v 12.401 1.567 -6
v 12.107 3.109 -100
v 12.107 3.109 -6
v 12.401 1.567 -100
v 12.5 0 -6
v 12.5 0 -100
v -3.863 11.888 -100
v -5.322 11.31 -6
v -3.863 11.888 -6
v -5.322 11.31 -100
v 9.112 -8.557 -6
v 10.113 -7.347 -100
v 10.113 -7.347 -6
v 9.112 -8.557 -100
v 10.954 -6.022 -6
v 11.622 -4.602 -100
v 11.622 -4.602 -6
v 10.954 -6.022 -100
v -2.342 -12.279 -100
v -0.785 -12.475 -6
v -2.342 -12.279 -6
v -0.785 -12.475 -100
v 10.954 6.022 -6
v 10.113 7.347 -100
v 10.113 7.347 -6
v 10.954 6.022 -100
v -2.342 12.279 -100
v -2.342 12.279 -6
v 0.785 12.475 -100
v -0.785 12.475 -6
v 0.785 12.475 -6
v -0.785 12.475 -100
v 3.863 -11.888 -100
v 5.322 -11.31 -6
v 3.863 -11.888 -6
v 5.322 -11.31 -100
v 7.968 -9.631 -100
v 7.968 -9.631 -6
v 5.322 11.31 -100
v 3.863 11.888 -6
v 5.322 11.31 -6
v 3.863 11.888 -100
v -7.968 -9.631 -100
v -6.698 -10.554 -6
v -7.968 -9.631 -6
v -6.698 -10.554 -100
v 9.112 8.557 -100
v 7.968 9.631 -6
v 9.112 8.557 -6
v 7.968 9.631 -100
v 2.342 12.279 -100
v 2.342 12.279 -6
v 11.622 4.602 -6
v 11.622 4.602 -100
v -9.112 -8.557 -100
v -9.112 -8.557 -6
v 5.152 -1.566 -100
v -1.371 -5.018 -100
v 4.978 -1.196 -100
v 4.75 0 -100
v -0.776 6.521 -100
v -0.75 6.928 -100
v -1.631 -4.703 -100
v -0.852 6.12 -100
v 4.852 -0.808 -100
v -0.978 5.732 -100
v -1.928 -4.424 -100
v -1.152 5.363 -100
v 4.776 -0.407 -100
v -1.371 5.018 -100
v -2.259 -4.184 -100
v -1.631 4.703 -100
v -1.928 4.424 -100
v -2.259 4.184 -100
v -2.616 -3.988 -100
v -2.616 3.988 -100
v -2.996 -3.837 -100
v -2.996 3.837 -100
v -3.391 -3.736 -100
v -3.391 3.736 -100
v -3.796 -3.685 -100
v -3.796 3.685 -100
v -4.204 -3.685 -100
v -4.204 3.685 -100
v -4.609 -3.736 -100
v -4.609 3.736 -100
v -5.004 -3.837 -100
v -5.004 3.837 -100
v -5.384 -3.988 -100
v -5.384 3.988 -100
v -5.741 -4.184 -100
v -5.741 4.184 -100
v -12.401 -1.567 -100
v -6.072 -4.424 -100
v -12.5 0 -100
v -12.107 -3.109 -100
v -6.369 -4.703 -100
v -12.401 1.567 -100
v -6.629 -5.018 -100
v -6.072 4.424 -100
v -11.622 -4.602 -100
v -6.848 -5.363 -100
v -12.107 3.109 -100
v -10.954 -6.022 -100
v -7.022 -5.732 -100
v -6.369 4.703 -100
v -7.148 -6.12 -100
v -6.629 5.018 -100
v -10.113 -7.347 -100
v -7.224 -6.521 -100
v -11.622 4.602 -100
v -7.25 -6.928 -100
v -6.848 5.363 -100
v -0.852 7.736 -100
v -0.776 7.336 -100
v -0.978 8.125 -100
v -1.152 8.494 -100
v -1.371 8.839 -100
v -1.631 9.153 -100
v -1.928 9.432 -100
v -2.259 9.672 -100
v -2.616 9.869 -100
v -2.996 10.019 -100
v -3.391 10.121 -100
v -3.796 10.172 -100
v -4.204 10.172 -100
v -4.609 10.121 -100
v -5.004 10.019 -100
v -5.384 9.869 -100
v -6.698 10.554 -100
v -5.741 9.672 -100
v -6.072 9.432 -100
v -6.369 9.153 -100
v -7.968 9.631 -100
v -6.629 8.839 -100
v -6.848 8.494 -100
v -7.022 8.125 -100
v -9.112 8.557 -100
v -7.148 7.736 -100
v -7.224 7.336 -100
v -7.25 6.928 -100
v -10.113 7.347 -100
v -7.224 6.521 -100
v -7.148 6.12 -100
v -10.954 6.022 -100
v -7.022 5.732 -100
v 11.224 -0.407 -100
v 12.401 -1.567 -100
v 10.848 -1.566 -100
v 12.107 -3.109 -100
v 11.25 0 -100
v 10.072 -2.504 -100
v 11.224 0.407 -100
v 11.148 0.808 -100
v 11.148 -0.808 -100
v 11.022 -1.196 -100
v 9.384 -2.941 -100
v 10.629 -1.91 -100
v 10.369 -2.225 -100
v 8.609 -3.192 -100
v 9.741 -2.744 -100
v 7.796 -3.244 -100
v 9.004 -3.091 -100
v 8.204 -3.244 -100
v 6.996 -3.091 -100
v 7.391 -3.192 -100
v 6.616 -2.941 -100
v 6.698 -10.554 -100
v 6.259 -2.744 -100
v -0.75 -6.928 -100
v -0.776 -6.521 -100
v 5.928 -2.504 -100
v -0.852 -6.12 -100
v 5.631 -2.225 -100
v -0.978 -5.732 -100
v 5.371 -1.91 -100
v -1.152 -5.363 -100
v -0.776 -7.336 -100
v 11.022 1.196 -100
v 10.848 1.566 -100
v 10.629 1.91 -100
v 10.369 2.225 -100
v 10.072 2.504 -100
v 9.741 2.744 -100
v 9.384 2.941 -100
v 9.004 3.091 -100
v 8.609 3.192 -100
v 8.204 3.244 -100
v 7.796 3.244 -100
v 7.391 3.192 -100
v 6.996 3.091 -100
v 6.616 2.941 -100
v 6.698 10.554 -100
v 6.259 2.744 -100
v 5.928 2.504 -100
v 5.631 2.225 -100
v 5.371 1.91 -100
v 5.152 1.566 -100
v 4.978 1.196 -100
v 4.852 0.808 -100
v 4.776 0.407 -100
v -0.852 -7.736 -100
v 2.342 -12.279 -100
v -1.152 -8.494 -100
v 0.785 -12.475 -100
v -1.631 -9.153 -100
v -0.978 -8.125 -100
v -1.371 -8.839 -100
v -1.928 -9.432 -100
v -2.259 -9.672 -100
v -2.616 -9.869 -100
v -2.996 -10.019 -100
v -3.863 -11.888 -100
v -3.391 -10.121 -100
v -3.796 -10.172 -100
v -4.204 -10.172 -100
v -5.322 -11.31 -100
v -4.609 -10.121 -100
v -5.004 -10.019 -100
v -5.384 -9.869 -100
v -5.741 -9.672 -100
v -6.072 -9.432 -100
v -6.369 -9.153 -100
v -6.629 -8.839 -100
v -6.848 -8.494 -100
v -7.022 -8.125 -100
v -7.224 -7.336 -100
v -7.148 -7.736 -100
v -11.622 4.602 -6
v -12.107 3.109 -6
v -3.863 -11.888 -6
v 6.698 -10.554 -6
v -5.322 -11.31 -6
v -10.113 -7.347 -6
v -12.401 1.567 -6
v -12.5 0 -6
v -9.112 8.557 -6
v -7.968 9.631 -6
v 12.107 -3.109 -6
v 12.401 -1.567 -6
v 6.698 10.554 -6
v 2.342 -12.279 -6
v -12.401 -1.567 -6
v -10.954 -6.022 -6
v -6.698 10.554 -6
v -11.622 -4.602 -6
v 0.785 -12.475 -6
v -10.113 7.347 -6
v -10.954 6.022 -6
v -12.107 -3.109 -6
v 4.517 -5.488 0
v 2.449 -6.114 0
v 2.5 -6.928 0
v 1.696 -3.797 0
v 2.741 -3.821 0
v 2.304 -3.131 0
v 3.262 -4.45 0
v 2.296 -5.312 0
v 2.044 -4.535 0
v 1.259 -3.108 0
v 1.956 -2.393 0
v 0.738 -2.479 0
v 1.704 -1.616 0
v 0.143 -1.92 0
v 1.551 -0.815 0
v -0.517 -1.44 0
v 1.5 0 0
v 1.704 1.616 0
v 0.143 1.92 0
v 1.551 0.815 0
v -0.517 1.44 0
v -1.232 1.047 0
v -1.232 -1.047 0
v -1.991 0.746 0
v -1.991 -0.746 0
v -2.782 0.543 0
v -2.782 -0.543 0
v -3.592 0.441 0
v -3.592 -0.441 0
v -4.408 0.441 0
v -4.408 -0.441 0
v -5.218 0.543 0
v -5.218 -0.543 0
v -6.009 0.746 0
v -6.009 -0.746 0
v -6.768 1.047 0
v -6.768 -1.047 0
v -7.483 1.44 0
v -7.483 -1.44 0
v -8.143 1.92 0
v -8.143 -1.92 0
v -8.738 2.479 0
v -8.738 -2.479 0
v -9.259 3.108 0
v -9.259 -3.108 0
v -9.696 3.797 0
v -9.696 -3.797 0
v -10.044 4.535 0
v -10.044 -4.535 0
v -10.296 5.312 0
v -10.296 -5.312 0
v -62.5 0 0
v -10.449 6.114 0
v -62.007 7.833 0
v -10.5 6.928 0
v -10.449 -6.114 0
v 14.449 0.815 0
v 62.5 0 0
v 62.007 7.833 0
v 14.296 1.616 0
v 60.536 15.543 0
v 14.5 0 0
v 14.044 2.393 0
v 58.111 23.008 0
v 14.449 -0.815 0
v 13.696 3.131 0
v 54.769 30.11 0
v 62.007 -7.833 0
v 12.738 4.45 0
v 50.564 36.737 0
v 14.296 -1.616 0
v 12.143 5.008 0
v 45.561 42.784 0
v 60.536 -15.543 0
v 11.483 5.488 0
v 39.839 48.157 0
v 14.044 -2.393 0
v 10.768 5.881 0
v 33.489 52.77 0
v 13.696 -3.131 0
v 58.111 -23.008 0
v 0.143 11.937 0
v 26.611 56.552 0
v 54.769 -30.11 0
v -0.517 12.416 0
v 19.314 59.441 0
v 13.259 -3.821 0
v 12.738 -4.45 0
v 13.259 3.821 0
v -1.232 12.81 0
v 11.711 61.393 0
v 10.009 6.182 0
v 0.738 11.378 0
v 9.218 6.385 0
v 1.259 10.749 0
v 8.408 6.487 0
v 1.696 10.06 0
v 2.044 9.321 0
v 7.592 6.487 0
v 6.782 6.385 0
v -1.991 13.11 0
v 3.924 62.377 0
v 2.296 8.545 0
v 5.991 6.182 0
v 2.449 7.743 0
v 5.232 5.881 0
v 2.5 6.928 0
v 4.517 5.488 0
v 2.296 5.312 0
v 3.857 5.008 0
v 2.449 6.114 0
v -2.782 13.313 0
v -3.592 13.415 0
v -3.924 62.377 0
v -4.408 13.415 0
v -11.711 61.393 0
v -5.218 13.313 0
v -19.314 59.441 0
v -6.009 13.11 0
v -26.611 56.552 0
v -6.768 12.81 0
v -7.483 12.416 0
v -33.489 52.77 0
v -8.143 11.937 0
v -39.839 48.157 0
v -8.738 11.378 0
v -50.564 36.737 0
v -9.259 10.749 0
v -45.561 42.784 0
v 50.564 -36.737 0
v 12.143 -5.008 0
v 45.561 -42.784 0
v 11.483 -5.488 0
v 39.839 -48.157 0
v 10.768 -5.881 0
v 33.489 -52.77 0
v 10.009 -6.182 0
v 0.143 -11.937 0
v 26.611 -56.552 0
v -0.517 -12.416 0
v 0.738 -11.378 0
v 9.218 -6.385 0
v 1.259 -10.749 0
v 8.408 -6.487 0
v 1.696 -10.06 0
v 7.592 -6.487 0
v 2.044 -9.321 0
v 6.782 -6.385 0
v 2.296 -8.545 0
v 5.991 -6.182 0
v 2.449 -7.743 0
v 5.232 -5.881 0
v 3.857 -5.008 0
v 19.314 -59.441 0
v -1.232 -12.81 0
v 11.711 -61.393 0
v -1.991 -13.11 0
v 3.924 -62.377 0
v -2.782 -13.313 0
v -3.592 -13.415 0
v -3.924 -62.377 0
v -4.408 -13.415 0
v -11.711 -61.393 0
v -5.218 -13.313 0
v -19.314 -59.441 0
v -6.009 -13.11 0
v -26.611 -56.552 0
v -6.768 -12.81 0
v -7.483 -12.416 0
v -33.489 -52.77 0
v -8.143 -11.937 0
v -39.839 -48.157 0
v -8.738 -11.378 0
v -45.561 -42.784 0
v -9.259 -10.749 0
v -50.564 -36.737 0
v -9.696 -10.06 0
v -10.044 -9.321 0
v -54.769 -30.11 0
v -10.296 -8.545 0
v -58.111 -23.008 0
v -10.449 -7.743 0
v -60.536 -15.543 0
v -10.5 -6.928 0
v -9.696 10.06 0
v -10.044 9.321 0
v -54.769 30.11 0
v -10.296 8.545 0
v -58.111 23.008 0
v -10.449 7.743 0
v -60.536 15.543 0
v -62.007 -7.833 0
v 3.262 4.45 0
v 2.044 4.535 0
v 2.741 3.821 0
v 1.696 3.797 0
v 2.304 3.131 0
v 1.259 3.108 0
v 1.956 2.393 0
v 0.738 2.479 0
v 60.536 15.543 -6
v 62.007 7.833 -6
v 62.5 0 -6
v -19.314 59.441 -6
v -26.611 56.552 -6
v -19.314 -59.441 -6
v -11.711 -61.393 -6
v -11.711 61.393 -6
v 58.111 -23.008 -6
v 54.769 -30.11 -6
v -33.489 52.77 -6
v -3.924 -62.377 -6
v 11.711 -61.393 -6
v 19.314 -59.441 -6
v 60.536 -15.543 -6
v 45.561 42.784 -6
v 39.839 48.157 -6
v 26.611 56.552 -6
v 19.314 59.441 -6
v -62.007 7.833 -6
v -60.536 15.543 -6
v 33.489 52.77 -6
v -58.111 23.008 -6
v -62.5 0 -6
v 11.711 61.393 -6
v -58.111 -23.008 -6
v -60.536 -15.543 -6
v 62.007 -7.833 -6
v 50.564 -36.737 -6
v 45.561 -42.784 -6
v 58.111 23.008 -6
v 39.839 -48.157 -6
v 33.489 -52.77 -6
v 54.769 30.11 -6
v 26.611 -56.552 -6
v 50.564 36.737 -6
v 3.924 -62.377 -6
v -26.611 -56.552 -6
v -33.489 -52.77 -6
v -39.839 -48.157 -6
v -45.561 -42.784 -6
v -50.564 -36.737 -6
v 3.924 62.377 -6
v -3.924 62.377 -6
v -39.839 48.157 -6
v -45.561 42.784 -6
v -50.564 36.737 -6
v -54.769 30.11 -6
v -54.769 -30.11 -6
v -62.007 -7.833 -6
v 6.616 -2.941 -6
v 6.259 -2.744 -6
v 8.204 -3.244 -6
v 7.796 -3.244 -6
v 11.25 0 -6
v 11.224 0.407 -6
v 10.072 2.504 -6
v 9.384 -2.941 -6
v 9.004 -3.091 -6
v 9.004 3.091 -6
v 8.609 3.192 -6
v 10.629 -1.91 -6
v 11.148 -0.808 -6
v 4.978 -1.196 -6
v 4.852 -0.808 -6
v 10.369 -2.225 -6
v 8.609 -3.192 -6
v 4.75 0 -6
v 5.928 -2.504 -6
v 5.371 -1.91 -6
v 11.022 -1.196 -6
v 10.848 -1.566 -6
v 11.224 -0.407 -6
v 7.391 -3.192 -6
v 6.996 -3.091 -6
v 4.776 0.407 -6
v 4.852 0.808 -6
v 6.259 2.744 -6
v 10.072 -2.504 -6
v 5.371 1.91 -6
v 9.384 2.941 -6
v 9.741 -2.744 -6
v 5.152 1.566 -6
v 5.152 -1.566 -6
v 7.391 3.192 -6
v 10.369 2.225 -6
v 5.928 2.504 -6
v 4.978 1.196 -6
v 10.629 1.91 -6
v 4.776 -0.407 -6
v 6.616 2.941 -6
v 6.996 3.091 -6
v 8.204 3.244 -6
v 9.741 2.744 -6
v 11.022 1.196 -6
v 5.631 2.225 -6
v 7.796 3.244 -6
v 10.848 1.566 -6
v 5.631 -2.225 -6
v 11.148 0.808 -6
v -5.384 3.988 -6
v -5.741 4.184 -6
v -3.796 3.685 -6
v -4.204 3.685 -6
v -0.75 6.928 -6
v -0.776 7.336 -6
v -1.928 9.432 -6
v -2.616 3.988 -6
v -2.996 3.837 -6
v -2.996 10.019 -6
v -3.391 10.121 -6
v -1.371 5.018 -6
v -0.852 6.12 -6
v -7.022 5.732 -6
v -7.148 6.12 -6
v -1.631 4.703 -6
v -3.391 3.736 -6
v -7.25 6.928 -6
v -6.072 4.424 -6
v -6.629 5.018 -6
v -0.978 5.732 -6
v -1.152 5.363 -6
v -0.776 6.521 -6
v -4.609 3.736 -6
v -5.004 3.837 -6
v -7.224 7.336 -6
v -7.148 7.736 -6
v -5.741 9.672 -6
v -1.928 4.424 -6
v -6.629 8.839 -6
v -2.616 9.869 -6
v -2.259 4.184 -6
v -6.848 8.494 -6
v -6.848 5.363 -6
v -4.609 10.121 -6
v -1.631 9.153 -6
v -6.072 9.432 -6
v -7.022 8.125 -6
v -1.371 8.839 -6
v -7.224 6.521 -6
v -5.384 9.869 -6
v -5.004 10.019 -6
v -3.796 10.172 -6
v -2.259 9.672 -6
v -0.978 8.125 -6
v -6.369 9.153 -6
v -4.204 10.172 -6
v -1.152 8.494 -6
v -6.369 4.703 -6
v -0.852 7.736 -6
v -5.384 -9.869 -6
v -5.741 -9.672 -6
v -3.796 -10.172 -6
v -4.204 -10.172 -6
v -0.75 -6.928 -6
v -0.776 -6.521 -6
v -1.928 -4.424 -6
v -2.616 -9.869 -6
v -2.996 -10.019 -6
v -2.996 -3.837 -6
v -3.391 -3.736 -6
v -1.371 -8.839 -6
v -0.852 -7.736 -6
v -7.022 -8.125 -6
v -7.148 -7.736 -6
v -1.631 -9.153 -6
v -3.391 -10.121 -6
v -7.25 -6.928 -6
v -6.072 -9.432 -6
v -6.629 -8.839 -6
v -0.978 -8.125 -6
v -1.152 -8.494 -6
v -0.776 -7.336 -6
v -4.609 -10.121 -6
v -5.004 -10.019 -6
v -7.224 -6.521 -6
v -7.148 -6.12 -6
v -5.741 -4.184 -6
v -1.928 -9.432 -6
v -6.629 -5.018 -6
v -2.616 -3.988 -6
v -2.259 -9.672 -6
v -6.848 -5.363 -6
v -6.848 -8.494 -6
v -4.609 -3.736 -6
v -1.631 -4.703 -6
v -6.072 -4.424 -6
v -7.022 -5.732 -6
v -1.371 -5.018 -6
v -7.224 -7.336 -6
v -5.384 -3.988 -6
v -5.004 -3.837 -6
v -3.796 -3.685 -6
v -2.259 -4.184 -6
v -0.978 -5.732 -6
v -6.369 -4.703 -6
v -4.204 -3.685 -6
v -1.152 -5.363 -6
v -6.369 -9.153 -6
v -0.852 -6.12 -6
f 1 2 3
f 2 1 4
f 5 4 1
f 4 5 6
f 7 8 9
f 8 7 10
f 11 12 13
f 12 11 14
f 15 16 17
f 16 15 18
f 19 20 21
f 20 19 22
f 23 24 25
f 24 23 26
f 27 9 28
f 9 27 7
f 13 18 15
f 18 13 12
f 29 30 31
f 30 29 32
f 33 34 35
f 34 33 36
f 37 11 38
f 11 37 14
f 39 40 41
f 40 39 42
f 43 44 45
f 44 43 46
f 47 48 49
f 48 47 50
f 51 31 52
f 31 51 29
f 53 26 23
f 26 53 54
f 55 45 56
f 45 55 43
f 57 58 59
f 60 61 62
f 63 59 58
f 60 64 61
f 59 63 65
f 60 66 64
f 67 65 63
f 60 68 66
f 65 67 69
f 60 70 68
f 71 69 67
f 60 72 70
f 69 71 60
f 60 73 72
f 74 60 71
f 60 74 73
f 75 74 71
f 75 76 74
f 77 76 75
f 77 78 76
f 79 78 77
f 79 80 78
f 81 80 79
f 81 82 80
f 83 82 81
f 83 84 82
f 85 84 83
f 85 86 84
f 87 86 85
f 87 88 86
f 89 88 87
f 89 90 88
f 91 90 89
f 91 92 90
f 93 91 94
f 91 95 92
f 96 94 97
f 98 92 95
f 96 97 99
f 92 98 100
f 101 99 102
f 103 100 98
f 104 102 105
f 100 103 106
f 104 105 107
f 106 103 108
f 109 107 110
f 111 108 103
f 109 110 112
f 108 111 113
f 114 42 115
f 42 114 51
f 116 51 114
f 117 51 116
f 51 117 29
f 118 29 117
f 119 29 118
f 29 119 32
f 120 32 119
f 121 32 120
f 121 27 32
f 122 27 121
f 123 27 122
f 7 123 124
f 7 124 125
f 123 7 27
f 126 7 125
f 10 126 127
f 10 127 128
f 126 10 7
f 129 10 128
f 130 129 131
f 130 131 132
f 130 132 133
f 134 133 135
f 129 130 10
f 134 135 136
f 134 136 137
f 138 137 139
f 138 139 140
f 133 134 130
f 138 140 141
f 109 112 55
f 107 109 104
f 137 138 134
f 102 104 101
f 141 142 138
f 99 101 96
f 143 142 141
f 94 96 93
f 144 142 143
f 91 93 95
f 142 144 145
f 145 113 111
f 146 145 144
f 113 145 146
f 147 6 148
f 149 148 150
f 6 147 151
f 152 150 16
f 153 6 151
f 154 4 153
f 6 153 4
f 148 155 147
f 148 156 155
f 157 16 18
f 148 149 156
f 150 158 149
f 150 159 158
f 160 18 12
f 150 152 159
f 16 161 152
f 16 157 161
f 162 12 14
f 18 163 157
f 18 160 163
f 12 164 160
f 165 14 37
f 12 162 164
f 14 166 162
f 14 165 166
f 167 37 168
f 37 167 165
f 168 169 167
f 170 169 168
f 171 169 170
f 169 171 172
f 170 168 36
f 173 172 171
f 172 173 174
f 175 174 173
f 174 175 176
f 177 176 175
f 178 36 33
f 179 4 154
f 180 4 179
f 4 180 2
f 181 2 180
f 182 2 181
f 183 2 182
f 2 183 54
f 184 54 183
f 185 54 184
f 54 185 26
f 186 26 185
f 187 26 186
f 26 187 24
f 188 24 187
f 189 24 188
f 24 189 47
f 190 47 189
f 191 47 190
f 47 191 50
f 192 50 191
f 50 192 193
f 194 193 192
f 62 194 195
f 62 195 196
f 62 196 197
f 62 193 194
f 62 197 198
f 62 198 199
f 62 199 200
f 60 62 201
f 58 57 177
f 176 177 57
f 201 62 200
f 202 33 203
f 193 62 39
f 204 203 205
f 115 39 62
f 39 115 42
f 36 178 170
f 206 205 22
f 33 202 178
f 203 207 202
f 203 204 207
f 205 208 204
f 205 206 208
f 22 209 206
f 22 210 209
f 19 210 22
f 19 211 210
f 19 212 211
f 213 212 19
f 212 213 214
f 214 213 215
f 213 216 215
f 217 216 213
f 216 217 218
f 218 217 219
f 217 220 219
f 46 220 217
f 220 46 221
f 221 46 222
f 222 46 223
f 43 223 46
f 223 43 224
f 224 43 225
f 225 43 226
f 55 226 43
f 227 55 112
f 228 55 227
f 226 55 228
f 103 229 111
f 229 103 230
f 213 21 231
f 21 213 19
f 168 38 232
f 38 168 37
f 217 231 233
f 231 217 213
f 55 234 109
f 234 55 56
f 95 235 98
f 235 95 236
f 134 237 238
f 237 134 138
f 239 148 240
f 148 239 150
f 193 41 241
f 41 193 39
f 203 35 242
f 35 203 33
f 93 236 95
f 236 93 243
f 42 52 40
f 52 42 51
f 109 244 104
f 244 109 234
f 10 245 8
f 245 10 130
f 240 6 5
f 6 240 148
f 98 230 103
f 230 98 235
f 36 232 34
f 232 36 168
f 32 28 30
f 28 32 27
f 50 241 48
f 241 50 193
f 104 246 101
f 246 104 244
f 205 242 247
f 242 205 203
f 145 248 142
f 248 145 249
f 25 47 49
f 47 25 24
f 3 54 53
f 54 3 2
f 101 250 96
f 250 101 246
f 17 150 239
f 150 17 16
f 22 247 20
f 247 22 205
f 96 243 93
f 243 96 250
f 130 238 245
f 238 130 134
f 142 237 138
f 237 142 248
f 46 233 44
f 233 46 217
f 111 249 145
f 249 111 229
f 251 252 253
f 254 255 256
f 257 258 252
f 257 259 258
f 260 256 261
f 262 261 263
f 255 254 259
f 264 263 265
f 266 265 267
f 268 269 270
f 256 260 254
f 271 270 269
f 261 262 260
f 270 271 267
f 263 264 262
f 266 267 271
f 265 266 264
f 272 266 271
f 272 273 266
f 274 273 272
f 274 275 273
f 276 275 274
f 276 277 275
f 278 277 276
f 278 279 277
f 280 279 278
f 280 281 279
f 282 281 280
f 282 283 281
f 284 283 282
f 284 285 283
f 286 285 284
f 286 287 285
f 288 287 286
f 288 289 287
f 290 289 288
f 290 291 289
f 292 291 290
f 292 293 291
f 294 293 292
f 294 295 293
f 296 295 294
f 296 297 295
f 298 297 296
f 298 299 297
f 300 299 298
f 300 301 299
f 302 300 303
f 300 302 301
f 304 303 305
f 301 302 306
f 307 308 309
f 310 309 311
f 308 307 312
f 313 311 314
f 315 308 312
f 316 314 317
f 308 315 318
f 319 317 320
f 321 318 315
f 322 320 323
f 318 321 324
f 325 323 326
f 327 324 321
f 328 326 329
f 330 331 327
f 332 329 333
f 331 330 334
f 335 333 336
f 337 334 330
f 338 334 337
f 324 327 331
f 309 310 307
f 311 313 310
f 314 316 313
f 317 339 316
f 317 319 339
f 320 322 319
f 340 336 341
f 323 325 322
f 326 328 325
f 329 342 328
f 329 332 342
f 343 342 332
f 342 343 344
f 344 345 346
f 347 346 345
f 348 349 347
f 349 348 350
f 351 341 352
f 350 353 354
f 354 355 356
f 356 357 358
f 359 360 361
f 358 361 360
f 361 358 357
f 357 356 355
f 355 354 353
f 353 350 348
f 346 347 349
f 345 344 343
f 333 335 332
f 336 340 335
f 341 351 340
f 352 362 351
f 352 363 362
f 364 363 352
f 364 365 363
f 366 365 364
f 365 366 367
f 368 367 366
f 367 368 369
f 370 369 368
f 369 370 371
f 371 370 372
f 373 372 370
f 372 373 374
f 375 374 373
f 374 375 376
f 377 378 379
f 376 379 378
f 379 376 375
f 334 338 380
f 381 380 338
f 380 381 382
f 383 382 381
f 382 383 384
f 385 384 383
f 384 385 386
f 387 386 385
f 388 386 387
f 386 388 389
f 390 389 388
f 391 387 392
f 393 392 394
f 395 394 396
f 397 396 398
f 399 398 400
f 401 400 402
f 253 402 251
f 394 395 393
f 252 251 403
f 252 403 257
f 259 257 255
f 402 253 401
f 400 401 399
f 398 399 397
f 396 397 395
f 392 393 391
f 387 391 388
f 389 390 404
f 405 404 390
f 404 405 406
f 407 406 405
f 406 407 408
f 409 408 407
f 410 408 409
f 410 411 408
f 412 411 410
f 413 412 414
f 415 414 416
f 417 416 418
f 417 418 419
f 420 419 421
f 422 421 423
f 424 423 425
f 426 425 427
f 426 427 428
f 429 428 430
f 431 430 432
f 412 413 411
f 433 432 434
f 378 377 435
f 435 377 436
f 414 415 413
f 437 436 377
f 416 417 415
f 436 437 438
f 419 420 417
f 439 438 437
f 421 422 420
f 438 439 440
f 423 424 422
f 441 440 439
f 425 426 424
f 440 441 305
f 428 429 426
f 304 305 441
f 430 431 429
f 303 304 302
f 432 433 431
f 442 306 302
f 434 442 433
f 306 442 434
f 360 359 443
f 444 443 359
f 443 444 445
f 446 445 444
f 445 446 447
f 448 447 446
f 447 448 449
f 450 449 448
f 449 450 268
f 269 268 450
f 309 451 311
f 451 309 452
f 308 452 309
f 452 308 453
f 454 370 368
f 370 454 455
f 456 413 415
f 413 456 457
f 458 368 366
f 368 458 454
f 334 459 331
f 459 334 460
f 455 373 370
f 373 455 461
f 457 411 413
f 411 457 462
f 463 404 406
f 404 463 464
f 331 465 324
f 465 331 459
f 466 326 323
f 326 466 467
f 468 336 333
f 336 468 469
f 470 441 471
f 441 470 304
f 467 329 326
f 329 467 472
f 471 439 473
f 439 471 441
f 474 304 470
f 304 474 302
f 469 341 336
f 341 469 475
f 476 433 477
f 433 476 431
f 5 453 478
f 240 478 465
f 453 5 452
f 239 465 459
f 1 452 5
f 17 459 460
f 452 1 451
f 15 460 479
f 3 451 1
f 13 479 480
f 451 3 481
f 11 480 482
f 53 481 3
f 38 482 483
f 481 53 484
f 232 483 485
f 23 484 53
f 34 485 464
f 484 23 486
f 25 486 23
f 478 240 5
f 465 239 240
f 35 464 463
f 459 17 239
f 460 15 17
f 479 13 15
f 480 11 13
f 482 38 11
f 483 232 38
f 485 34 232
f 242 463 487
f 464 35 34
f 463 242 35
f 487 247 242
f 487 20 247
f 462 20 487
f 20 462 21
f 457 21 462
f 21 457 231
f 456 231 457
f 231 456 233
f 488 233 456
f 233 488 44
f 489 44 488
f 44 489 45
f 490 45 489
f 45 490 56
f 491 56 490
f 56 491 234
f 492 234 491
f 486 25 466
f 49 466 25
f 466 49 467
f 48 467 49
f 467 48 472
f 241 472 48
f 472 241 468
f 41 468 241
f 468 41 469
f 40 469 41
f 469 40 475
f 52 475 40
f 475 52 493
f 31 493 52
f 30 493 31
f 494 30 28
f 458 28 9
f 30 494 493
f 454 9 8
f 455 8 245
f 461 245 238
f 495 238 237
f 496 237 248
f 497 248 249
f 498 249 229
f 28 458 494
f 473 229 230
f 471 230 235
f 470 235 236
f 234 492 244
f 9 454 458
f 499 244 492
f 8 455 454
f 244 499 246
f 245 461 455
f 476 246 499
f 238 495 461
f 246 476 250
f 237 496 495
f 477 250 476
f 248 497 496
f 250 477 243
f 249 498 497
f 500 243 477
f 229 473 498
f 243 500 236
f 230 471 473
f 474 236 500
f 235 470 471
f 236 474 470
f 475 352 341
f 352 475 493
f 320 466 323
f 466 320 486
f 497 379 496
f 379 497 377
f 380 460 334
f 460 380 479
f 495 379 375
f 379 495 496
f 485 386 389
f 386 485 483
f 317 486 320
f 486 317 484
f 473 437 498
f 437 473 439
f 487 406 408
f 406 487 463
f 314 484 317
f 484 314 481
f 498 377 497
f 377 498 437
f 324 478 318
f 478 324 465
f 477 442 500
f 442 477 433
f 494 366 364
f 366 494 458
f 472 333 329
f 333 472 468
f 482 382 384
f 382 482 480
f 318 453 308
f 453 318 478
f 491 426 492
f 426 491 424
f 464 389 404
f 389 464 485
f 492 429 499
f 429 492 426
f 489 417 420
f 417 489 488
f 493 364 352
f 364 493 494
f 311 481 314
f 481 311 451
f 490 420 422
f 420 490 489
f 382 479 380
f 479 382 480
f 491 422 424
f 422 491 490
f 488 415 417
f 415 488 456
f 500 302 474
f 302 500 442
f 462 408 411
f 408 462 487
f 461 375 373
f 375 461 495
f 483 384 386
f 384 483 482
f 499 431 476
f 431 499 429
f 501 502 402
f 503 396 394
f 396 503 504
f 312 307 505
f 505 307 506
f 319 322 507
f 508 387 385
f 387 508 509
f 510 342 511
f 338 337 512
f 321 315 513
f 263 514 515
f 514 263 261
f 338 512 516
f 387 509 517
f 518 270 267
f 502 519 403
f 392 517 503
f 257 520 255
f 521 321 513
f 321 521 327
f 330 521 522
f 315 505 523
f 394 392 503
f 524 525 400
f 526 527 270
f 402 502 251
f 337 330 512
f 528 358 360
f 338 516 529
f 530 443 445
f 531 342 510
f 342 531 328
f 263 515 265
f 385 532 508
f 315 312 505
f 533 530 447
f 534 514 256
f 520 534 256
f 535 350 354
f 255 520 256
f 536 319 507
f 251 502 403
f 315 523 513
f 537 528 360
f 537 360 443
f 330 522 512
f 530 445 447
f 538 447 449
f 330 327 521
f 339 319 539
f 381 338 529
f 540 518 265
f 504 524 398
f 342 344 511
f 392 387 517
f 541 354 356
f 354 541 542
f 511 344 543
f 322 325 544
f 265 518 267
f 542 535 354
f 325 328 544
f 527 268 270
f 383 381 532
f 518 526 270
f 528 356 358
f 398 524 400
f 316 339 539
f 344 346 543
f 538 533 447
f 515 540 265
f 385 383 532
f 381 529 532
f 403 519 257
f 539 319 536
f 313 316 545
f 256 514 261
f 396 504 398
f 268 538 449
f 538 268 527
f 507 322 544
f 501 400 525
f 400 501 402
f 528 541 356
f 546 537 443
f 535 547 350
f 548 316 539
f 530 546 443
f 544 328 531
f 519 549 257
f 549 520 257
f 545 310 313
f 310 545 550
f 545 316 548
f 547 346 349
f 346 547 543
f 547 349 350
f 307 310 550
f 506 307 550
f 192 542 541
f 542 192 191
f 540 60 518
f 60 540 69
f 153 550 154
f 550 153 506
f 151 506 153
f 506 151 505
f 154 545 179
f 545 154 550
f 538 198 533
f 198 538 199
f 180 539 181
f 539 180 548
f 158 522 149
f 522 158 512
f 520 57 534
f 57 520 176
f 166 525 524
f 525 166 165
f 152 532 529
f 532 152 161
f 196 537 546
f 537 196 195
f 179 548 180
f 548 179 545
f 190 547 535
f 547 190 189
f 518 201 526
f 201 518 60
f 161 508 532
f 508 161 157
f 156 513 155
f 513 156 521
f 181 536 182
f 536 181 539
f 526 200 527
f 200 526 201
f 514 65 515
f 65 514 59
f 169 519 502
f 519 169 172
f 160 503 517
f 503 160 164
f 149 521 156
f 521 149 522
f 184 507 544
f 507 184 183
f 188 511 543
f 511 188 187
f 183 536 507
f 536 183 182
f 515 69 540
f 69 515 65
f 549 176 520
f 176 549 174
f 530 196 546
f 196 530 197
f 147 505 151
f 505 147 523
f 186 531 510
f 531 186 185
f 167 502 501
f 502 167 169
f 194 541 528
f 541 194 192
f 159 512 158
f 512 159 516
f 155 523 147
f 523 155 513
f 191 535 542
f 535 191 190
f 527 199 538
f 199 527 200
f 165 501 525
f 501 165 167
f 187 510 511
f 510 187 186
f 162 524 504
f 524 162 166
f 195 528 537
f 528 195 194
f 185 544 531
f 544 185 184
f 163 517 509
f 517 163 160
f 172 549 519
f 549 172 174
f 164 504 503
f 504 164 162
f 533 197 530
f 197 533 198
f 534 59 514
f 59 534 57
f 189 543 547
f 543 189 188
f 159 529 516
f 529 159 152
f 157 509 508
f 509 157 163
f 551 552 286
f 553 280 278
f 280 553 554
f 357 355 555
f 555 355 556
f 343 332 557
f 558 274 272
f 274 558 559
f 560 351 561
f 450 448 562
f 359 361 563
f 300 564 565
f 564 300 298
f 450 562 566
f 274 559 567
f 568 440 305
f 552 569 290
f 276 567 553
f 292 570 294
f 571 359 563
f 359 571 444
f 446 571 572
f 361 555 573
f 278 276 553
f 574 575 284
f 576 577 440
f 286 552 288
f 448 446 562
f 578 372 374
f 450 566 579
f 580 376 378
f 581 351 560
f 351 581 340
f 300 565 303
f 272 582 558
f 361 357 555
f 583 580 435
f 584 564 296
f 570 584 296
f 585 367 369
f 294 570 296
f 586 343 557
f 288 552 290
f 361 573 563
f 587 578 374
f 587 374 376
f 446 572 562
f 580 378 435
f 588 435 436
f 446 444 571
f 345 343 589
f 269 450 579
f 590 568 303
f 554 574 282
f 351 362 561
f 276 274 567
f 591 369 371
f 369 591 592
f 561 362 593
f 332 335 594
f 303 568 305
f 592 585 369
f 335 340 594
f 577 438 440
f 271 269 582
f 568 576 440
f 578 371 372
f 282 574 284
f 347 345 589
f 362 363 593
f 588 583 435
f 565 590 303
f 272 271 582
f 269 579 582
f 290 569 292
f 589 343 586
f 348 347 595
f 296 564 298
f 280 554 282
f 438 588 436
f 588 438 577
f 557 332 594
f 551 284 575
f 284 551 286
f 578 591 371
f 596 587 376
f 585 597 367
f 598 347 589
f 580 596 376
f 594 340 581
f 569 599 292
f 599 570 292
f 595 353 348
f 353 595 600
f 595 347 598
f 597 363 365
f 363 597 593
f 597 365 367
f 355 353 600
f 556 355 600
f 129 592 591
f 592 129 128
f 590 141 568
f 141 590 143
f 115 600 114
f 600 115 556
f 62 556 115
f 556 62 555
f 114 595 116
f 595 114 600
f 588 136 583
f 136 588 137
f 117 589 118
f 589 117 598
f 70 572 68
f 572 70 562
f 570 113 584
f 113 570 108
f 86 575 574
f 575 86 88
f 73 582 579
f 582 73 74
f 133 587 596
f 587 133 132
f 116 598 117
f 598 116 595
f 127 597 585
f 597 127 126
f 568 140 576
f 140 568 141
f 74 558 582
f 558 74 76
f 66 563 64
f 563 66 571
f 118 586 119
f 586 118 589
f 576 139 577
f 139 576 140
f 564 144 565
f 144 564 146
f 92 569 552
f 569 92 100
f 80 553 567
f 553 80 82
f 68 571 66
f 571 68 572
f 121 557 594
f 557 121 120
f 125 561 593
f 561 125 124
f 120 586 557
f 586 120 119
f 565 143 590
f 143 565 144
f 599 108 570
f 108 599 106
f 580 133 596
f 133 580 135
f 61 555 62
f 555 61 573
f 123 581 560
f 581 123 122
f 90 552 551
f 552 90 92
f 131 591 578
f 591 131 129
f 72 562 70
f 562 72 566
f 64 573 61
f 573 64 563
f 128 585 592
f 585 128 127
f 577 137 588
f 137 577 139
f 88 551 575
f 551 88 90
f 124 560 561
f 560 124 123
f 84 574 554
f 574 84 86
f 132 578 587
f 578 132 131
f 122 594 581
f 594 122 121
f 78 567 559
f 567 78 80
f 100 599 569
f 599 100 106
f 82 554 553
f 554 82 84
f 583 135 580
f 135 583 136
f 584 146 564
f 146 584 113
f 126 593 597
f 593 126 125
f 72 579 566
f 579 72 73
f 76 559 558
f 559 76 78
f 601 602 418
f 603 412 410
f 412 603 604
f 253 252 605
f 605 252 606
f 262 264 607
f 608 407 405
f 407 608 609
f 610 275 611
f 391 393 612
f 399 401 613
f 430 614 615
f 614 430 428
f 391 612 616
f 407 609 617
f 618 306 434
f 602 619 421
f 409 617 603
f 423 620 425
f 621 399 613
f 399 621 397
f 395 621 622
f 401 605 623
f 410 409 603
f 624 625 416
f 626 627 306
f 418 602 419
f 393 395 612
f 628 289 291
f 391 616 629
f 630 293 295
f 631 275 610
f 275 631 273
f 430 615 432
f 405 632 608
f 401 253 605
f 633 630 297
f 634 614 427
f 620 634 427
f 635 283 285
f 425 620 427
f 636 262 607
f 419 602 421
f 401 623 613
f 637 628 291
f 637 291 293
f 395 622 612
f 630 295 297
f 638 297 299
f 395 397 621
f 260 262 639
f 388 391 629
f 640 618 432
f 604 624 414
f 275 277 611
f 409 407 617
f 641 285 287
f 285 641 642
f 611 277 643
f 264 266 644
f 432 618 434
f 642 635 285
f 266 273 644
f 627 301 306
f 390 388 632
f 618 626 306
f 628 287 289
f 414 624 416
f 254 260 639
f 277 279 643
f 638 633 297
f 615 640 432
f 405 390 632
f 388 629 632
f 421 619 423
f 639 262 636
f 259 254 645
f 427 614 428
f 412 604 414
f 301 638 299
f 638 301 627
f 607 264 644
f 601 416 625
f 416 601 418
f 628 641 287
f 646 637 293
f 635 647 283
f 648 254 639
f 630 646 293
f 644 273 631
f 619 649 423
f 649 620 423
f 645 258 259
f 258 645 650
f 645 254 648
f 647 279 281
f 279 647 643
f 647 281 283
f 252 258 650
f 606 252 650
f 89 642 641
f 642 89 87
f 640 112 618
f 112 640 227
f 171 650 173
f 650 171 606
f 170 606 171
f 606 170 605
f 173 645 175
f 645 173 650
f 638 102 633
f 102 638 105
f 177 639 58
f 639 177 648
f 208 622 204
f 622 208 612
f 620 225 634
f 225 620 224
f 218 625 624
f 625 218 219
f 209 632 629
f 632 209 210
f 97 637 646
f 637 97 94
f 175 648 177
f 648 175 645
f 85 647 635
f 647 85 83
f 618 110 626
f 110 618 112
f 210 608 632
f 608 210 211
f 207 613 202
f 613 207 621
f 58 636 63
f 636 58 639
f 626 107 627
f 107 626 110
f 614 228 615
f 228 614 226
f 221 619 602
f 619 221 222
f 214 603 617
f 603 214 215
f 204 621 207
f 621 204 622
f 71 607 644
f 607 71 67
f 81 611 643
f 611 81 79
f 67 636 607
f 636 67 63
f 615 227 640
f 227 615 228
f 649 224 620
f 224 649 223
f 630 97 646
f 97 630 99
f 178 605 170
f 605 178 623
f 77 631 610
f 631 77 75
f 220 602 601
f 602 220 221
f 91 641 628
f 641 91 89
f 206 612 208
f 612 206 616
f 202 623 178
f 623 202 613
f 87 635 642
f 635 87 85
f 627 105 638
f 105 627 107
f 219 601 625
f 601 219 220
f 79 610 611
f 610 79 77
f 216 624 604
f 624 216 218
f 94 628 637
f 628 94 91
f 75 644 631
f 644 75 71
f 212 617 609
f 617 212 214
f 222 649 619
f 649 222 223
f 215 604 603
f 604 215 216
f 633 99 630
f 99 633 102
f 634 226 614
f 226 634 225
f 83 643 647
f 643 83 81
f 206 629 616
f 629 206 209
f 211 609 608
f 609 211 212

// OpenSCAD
$fn = 50;


difference() {
	union() {
		translate(v = [0, 0, -100.0000000000]) {
			cylinder(h = 100, r = 12.5000000000);
		}
		translate(v = [0, 0, -6.0000000000]) {
			cylinder(h = 6, r = 62.5000000000);
		}
	}
	union() {
		translate(v = [8.0000000000, 0.0000000000, 0]) {
			rotate(a = [0, 0, 0]) {
				difference() {
					union() {
						#translate(v = [0, 0, -100.0000000000]) {
							cylinder(h = 100, r = 2.2500000000);
						}
						#translate(v = [0, 0, -6]) {
							cylinder(h = 6, r = 12.5000000000, r1 = 3.2500000000, r2 = 6.5000000000);
						}
						#translate(v = [0, 0, -100.0000000000]) {
							cylinder(h = 100, r = 3.2500000000);
						}
						#translate(v = [0, 0, -100.0000000000]) {
							cylinder(h = 100, r = 2.2500000000);
						}
					}
					union();
				}
			}
		}
		translate(v = [-4.0000000000, 6.9282032303, 0]) {
			rotate(a = [0, 0, 0]) {
				difference() {
					union() {
						#translate(v = [0, 0, -100.0000000000]) {
							cylinder(h = 100, r = 2.2500000000);
						}
						#translate(v = [0, 0, -6]) {
							cylinder(h = 6, r = 12.5000000000, r1 = 3.2500000000, r2 = 6.5000000000);
						}
						#translate(v = [0, 0, -100.0000000000]) {
							cylinder(h = 100, r = 3.2500000000);
						}
						#translate(v = [0, 0, -100.0000000000]) {
							cylinder(h = 100, r = 2.2500000000);
						}
					}
					union();
				}
			}
		}
		translate(v = [-4.0000000000, -6.9282032303, 0]) {
			rotate(a = [0, 0, 0]) {
				difference() {
					union() {
						#translate(v = [0, 0, -100.0000000000]) {
							cylinder(h = 100, r = 2.2500000000);
						}
						#translate(v = [0, 0, -6]) {
							cylinder(h = 6, r = 12.5000000000, r1 = 3.2500000000, r2 = 6.5000000000);
						}
						#translate(v = [0, 0, -100.0000000000]) {
							cylinder(h = 100, r = 3.2500000000);
						}
						#translate(v = [0, 0, -100.0000000000]) {
							cylinder(h = 100, r = 2.2500000000);
						}
					}
					union();
				}
			}
		}
	}
}
